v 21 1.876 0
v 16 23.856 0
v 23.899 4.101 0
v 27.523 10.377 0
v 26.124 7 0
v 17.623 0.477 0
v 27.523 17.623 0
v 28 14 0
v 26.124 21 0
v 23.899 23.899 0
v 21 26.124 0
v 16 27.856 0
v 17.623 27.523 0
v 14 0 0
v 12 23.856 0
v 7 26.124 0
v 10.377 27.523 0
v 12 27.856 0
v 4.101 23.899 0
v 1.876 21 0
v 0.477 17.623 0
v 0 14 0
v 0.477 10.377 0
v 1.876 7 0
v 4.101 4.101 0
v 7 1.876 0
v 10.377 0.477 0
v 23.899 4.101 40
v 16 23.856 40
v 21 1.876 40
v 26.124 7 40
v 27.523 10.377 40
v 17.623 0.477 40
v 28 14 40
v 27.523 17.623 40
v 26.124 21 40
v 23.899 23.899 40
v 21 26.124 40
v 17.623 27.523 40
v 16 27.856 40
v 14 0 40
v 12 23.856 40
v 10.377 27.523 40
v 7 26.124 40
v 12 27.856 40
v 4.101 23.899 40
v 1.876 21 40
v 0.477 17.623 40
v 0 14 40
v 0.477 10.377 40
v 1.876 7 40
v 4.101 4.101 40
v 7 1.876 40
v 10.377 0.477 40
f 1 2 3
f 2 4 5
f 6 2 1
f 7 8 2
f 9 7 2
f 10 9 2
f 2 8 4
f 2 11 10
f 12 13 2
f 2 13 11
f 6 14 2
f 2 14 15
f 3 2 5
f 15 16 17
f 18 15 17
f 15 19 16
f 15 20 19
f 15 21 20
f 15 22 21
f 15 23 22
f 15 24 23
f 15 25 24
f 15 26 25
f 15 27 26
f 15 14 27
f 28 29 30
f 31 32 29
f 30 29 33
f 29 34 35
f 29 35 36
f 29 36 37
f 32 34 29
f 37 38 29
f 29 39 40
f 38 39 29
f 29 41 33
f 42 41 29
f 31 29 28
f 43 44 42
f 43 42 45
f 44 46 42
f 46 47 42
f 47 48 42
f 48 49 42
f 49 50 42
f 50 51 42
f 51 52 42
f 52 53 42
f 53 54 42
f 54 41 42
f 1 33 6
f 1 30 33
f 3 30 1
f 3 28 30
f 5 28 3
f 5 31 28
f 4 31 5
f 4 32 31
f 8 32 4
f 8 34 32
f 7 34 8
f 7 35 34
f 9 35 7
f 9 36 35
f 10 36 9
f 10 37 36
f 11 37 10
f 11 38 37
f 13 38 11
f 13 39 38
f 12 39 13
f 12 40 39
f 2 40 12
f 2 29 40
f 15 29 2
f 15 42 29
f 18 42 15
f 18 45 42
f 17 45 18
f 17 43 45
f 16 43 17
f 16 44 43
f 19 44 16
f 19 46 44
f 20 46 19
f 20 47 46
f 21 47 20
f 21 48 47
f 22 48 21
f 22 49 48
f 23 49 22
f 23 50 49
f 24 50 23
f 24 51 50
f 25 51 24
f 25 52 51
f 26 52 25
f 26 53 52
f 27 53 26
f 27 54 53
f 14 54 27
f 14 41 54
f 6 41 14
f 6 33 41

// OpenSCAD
$fn = 32;

// ----------------------------------------------------------------------
// Keyway shaft: d28 shaft, key 4 x 4 mm
// ----------------------------------------------------------------------

// --- parameters (mm) ---
shaft_r = 14;             // shaft radius
key_w = 4;                // keyway width
key_d = 4;                // keyway depth below the surface line
plate_t = 40;             // shaft length, Z (extrusion height)

shaft_d = 2 * shaft_r;  // shaft diameter
circle_step = 15;  // polygon sampling step, degrees

profile = [[10.377, 27.523], [7, 26.124], [4.101, 23.899], [1.876, 21], [0.477, 17.623], [0, 14], [0.477, 10.377], [1.876, 7], [4.101, 4.101], [7, 1.876], [10.377, 0.477], [14, 0], [17.623, 0.477], [21, 1.876], [23.899, 4.101], [26.124, 7], [27.523, 10.377], [28, 14], [27.523, 17.623], [26.124, 21], [23.899, 23.899], [21, 26.124], [17.623, 27.523], [16, 27.856], [16, 23.856], [12, 23.856], [12, 27.856]];  // primary outline, 27 points, counter clockwise

// --- the one profile operation ---
linear_extrude(height = plate_t) polygon(points = profile);
